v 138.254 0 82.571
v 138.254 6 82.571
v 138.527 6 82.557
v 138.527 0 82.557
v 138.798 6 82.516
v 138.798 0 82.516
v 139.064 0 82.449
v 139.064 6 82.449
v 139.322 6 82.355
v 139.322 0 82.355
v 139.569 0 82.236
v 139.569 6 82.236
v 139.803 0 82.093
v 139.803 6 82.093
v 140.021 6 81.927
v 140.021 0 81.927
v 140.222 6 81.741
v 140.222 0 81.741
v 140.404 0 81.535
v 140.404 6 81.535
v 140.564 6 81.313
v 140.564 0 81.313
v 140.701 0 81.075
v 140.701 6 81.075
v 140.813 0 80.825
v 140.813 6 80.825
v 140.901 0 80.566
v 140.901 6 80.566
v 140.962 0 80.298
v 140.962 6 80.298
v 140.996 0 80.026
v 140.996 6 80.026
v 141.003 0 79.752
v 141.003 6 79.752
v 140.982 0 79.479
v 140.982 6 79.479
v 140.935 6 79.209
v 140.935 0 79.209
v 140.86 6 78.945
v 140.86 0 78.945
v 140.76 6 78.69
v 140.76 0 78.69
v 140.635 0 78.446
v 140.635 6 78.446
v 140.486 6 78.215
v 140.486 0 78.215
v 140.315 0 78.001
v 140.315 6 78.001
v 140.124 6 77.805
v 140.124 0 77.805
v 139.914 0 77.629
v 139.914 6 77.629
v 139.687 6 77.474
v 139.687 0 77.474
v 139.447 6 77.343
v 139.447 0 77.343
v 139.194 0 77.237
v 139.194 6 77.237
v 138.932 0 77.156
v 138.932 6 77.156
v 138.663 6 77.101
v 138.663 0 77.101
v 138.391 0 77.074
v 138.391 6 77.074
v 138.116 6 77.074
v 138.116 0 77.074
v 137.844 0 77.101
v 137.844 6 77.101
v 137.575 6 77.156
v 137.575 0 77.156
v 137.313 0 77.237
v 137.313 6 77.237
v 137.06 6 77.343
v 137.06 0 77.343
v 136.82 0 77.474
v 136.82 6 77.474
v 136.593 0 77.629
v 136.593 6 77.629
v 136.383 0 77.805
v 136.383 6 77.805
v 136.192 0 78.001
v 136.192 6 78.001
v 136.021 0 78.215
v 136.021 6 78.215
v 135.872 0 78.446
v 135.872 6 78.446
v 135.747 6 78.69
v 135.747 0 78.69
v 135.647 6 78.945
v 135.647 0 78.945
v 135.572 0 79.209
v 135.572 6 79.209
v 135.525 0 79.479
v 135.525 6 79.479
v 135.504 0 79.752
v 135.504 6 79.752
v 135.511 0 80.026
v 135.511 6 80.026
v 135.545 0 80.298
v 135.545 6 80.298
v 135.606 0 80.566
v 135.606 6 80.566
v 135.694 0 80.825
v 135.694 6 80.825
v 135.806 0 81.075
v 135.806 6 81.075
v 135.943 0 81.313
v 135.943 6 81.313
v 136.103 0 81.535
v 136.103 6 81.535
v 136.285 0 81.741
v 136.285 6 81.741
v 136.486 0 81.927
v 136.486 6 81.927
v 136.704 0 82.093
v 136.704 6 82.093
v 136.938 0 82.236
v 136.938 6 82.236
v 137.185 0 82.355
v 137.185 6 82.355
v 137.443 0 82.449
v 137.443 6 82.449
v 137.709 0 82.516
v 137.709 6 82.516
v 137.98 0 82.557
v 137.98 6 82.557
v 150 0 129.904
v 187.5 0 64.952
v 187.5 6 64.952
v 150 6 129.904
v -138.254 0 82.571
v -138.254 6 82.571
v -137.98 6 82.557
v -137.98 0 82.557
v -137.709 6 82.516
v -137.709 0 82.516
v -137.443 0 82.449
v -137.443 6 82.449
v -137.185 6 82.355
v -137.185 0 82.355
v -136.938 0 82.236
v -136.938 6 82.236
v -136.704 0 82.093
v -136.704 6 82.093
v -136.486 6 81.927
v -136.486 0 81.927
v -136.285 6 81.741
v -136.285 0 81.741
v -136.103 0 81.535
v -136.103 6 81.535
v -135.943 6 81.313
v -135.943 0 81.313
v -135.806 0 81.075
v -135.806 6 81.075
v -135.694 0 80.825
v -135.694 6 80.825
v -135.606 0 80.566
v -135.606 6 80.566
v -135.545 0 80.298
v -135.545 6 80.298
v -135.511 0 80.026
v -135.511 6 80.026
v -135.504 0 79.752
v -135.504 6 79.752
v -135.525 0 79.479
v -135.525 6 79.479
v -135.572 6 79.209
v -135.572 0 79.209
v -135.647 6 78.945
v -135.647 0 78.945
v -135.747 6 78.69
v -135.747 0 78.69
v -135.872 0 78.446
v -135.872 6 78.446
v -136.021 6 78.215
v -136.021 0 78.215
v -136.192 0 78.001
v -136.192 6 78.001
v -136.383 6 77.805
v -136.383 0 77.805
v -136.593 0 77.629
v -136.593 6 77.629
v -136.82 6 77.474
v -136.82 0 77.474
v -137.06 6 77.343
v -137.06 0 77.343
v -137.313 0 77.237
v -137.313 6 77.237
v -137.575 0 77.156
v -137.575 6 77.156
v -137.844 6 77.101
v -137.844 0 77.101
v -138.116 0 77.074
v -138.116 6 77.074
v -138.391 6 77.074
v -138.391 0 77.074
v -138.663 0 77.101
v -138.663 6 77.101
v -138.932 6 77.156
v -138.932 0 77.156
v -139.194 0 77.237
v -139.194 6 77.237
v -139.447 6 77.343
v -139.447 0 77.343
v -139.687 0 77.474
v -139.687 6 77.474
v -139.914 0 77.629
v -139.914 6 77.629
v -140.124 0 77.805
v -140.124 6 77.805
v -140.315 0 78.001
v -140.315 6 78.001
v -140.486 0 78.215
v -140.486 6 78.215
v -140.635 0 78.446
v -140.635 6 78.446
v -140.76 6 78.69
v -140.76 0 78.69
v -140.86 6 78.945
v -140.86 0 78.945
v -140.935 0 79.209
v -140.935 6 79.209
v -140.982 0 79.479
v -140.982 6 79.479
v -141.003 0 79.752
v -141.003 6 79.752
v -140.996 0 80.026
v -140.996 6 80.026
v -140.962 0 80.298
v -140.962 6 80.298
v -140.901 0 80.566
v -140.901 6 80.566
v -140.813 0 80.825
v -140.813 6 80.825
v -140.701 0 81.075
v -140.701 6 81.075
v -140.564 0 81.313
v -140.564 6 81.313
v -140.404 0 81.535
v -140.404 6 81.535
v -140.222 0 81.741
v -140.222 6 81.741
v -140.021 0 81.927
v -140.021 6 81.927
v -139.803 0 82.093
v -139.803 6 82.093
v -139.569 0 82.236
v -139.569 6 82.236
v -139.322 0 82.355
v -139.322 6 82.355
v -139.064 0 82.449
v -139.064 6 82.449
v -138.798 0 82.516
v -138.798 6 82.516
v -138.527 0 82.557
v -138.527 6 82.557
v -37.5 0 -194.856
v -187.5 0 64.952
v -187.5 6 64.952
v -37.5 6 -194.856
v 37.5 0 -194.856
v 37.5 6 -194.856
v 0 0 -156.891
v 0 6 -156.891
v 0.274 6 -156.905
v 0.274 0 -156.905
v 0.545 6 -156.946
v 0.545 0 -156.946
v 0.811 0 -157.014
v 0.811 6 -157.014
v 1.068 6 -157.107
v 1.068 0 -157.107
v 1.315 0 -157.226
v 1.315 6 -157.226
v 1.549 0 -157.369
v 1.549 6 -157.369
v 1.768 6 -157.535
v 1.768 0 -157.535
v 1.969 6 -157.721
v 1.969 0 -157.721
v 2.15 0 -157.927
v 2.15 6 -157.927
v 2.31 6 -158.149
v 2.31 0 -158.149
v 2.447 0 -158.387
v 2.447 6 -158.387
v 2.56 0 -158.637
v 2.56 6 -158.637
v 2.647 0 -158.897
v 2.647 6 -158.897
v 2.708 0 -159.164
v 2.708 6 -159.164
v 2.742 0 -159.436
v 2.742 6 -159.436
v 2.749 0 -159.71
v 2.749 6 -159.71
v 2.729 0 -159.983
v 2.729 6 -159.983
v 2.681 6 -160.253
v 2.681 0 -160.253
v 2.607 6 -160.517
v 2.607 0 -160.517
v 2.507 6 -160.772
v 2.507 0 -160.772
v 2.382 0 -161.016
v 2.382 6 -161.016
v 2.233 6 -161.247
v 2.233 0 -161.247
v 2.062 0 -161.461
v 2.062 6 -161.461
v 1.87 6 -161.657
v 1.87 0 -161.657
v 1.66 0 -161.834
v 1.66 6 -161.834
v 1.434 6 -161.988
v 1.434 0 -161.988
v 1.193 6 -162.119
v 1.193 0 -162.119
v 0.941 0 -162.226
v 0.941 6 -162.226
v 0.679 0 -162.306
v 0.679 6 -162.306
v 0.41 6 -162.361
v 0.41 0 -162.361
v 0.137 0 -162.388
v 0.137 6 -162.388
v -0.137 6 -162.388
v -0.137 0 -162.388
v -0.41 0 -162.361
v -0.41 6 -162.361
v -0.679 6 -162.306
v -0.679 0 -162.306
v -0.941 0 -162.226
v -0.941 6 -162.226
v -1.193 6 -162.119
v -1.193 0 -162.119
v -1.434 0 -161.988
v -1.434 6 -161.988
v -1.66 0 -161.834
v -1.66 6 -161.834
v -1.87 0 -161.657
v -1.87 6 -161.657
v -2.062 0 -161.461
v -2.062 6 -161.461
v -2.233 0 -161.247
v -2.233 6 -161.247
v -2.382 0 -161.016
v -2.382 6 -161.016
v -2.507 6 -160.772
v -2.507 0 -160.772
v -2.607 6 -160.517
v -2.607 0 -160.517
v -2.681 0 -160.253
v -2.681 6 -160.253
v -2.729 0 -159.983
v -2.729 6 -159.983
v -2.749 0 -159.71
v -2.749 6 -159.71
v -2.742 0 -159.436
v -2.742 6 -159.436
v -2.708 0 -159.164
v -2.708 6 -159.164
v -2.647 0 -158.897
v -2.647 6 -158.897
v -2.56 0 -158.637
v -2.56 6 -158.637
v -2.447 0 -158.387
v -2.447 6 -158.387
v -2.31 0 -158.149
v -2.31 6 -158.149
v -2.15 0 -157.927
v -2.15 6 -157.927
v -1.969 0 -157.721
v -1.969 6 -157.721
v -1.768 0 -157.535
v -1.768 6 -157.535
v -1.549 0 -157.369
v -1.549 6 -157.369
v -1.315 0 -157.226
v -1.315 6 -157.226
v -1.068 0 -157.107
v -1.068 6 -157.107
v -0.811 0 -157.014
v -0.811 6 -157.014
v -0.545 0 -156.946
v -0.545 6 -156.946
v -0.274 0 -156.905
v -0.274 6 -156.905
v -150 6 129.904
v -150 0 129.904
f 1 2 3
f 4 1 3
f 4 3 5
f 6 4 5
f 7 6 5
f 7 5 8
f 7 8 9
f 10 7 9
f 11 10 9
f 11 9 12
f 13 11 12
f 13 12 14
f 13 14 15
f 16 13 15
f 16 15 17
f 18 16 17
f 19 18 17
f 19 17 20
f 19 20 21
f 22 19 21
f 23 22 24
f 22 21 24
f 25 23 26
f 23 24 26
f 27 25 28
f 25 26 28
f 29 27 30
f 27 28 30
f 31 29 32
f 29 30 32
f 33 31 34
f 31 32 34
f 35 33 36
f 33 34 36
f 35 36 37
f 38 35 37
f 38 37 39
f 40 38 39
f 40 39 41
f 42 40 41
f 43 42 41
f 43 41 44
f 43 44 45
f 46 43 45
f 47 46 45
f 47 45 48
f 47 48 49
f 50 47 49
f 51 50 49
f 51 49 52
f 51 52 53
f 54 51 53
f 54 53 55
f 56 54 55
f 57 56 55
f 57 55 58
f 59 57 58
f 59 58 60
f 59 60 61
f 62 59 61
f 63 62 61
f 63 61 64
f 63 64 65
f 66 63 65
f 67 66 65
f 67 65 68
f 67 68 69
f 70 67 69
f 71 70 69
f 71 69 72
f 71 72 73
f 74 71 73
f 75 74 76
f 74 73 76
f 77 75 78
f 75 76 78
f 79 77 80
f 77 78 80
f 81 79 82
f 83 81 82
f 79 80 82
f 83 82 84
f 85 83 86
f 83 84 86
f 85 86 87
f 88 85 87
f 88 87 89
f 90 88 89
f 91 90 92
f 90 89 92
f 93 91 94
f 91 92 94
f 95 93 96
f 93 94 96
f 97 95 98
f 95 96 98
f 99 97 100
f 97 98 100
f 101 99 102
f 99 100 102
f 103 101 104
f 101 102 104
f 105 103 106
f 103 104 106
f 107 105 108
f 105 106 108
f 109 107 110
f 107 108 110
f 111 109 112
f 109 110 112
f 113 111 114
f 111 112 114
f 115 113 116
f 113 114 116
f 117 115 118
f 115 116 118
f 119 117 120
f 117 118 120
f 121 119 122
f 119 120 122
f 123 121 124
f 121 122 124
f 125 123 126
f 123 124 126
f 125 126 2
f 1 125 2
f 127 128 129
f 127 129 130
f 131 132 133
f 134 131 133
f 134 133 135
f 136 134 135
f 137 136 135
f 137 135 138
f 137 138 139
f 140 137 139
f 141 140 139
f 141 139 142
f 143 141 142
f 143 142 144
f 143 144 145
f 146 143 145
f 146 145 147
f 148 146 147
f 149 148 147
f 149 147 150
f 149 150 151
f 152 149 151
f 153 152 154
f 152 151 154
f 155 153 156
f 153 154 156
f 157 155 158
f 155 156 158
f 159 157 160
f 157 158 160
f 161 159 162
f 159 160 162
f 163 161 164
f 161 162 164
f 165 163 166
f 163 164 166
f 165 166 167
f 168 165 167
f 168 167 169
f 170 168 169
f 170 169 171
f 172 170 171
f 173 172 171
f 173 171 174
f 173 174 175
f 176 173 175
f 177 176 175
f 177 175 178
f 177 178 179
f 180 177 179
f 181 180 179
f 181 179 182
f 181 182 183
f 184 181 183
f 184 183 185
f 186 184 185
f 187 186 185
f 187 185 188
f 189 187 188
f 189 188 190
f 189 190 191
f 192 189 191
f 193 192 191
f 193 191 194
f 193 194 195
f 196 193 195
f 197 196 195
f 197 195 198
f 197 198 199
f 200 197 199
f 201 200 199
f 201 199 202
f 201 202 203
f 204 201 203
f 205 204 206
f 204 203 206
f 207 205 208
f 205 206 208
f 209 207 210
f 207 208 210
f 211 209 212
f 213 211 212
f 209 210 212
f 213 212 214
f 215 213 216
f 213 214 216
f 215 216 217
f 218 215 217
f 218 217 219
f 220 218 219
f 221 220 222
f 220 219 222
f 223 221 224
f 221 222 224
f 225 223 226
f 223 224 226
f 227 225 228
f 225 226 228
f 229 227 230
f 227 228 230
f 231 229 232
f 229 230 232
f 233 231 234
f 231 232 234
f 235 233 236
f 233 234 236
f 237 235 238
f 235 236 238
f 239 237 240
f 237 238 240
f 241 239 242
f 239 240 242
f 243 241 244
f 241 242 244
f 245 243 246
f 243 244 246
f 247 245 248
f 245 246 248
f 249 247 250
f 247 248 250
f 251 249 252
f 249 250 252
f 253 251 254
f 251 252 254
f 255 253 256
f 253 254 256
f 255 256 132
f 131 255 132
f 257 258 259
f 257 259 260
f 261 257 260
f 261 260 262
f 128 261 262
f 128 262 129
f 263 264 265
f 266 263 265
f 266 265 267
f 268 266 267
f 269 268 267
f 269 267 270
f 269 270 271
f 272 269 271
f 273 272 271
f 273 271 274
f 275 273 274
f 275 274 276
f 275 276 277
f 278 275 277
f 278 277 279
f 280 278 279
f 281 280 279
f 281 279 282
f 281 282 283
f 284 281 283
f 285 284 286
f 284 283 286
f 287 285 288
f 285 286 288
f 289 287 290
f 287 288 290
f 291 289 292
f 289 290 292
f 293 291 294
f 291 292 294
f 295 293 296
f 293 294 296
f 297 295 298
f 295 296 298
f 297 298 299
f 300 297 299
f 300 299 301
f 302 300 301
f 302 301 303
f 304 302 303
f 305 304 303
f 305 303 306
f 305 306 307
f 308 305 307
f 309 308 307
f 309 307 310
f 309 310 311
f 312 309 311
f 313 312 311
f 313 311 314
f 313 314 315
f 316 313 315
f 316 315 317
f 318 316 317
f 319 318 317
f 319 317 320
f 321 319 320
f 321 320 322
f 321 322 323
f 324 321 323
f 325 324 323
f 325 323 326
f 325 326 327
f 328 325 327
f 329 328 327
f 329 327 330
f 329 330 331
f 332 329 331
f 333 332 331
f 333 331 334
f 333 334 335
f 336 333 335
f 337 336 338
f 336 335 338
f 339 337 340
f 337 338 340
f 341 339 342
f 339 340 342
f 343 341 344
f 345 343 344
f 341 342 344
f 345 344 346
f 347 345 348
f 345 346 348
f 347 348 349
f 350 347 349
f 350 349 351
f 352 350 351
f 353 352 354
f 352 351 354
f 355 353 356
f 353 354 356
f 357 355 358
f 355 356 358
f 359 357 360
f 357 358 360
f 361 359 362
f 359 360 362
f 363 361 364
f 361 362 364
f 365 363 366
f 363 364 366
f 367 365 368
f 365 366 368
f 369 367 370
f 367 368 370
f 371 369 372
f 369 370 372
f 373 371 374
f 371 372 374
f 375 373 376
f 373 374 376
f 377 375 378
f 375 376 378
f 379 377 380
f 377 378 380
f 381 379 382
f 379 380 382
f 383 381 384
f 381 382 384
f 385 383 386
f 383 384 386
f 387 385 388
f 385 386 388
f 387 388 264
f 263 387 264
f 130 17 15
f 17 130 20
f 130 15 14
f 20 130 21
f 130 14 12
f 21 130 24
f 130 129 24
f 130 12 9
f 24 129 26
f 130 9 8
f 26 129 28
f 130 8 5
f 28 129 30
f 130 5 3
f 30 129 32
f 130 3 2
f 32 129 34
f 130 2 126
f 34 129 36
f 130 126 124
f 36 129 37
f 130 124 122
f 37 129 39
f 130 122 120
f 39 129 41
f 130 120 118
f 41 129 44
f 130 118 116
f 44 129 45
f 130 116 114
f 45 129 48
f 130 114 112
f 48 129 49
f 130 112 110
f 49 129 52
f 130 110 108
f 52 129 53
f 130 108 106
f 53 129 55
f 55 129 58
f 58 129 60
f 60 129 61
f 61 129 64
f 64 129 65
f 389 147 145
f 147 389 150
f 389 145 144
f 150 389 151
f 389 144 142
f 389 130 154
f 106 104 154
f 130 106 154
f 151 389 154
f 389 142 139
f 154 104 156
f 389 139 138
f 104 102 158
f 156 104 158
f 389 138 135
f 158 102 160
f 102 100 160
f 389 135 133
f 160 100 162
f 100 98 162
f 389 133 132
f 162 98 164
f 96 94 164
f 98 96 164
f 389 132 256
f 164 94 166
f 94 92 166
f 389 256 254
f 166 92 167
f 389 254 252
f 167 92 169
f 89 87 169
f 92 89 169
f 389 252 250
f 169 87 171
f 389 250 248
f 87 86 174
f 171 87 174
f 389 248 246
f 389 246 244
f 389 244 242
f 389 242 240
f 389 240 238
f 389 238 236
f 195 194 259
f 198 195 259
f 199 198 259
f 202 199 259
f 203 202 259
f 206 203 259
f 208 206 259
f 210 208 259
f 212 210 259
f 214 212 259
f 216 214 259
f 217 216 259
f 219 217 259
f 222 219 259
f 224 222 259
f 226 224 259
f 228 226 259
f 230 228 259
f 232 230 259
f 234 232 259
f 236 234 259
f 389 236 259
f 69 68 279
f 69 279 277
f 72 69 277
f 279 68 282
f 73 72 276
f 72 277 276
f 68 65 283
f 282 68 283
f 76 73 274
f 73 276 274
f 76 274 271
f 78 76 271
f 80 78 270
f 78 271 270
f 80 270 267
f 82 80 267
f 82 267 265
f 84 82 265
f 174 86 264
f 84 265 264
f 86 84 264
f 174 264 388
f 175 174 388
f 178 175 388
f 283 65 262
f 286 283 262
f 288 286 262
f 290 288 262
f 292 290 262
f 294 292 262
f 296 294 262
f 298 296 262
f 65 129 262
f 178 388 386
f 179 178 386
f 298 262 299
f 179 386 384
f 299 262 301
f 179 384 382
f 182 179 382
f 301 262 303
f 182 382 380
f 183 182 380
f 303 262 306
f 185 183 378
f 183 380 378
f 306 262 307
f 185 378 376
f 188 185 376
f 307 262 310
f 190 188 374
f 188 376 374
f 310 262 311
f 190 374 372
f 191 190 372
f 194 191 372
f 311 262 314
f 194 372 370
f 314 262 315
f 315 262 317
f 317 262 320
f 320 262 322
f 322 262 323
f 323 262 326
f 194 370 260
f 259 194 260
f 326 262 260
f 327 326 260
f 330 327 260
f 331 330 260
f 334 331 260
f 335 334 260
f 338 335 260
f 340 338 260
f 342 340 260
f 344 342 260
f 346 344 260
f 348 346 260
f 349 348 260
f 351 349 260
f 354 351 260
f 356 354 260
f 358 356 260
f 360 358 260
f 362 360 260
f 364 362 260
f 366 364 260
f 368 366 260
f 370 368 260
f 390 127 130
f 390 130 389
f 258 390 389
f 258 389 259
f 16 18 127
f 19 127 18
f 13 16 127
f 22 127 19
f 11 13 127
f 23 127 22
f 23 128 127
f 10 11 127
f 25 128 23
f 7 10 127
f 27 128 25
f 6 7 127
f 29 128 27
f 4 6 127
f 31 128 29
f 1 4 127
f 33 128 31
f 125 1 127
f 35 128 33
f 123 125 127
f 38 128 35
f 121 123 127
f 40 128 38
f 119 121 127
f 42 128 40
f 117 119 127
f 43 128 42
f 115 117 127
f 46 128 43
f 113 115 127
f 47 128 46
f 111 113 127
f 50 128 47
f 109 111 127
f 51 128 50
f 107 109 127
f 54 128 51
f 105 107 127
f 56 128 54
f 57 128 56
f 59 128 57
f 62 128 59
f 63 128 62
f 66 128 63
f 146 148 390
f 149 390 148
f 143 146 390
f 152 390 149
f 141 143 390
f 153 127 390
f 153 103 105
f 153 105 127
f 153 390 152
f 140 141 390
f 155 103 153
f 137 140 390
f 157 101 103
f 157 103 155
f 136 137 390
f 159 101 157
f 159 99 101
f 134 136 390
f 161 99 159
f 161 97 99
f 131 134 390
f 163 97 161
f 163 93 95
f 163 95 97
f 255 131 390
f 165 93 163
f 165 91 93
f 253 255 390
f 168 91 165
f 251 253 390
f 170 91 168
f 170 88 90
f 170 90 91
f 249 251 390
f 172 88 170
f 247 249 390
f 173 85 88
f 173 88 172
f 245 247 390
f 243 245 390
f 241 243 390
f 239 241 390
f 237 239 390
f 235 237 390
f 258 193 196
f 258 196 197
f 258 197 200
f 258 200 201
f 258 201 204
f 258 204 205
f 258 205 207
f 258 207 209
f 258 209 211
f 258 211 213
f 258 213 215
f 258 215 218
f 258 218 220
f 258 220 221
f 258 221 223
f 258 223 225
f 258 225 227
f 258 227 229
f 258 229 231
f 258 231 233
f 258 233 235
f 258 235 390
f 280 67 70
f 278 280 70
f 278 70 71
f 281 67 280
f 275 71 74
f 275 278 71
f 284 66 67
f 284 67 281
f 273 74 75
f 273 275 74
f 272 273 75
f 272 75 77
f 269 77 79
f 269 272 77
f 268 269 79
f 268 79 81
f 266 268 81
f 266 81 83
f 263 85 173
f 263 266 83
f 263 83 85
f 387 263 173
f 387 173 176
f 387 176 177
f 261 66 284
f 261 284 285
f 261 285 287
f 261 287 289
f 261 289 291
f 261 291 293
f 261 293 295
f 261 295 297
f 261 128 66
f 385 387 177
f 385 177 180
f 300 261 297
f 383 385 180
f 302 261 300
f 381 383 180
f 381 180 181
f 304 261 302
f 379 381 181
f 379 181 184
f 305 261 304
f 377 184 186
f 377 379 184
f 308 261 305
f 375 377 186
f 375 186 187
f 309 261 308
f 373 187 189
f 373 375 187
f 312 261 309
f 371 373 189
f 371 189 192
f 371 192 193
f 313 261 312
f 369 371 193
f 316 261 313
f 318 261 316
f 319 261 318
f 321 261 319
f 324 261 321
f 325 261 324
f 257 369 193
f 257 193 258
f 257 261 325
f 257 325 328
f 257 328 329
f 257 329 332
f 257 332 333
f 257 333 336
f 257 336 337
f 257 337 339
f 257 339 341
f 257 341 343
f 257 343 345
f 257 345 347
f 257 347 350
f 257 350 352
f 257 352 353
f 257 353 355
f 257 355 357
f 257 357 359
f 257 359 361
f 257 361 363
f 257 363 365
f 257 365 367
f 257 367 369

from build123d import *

# Parameters (mm, degrees)
BOSS_EXTRU_1_DEPTH      = 6
ENL_V_MAT_EXTRU_1_REACH = 272.483
ESQUISSE2_R             = 2.75


with BuildPart() as part:
    # Esquisse1 → Boss.-Extru.1 (new body)
    with BuildSketch(Plane(origin=(0, 0, 0), x_dir=(1, 0, 0), z_dir=(0, 1, 0))):
        Polygon((-37.5, 194.855715851), (37.5, 194.855715851), (187.5, -64.951905284), (150, -129.903810568), (-150, -129.903810568), (-187.5, -64.951905284), align=None)
    extrude(amount=BOSS_EXTRU_1_DEPTH)

    # Esquisse2 → Enlèv. mat.-Extru.1 (cut, up to next)
    with BuildSketch(Plane(origin=(0, 6, 0), x_dir=(1, 0, 0), z_dir=(0, 1, 0)), mode=Mode.PRIVATE) as enl_v_mat_extru_1_sk1:
        with Locations(Location((0, 159.641425484, 0), (0, 0, 270))):
            Circle(ESQUISSE2_R)
    enl_v_mat_extru_1_tool1 = extrude(enl_v_mat_extru_1_sk1.sketch, amount=-ENL_V_MAT_EXTRU_1_REACH, mode=Mode.PRIVATE) & part.part
    # Esquisse2 → Enlèv. mat.-Extru.1 (cut, up to next)
    with BuildSketch(Plane(origin=(0, 6, 0), x_dir=(1, 0, 0), z_dir=(0, 1, 0)), mode=Mode.PRIVATE) as enl_v_mat_extru_1_sk2:
        with Locations(Location((-138.253529965, -79.820712742, 0), (0, 0, 270))):
            Circle(ESQUISSE2_R)
    enl_v_mat_extru_1_tool2 = extrude(enl_v_mat_extru_1_sk2.sketch, amount=-ENL_V_MAT_EXTRU_1_REACH, mode=Mode.PRIVATE) & part.part
    # Esquisse2 → Enlèv. mat.-Extru.1 (cut, up to next)
    with BuildSketch(Plane(origin=(0, 6, 0), x_dir=(1, 0, 0), z_dir=(0, 1, 0)), mode=Mode.PRIVATE) as enl_v_mat_extru_1_sk3:
        with Locations(Location((138.253529965, -79.820712742, 0), (0, 0, 270))):
            Circle(ESQUISSE2_R)
    enl_v_mat_extru_1_tool3 = extrude(enl_v_mat_extru_1_sk3.sketch, amount=-ENL_V_MAT_EXTRU_1_REACH, mode=Mode.PRIVATE) & part.part
    add(enl_v_mat_extru_1_tool1.solids().sort_by_distance((0, 6, -159.641425))[0], mode=Mode.SUBTRACT)
    add(enl_v_mat_extru_1_tool2.solids().sort_by_distance((-138.25353, 6, 79.820713))[0], mode=Mode.SUBTRACT)
    add(enl_v_mat_extru_1_tool3.solids().sort_by_distance((138.25353, 6, 79.820713))[0], mode=Mode.SUBTRACT)


solid = part.part
